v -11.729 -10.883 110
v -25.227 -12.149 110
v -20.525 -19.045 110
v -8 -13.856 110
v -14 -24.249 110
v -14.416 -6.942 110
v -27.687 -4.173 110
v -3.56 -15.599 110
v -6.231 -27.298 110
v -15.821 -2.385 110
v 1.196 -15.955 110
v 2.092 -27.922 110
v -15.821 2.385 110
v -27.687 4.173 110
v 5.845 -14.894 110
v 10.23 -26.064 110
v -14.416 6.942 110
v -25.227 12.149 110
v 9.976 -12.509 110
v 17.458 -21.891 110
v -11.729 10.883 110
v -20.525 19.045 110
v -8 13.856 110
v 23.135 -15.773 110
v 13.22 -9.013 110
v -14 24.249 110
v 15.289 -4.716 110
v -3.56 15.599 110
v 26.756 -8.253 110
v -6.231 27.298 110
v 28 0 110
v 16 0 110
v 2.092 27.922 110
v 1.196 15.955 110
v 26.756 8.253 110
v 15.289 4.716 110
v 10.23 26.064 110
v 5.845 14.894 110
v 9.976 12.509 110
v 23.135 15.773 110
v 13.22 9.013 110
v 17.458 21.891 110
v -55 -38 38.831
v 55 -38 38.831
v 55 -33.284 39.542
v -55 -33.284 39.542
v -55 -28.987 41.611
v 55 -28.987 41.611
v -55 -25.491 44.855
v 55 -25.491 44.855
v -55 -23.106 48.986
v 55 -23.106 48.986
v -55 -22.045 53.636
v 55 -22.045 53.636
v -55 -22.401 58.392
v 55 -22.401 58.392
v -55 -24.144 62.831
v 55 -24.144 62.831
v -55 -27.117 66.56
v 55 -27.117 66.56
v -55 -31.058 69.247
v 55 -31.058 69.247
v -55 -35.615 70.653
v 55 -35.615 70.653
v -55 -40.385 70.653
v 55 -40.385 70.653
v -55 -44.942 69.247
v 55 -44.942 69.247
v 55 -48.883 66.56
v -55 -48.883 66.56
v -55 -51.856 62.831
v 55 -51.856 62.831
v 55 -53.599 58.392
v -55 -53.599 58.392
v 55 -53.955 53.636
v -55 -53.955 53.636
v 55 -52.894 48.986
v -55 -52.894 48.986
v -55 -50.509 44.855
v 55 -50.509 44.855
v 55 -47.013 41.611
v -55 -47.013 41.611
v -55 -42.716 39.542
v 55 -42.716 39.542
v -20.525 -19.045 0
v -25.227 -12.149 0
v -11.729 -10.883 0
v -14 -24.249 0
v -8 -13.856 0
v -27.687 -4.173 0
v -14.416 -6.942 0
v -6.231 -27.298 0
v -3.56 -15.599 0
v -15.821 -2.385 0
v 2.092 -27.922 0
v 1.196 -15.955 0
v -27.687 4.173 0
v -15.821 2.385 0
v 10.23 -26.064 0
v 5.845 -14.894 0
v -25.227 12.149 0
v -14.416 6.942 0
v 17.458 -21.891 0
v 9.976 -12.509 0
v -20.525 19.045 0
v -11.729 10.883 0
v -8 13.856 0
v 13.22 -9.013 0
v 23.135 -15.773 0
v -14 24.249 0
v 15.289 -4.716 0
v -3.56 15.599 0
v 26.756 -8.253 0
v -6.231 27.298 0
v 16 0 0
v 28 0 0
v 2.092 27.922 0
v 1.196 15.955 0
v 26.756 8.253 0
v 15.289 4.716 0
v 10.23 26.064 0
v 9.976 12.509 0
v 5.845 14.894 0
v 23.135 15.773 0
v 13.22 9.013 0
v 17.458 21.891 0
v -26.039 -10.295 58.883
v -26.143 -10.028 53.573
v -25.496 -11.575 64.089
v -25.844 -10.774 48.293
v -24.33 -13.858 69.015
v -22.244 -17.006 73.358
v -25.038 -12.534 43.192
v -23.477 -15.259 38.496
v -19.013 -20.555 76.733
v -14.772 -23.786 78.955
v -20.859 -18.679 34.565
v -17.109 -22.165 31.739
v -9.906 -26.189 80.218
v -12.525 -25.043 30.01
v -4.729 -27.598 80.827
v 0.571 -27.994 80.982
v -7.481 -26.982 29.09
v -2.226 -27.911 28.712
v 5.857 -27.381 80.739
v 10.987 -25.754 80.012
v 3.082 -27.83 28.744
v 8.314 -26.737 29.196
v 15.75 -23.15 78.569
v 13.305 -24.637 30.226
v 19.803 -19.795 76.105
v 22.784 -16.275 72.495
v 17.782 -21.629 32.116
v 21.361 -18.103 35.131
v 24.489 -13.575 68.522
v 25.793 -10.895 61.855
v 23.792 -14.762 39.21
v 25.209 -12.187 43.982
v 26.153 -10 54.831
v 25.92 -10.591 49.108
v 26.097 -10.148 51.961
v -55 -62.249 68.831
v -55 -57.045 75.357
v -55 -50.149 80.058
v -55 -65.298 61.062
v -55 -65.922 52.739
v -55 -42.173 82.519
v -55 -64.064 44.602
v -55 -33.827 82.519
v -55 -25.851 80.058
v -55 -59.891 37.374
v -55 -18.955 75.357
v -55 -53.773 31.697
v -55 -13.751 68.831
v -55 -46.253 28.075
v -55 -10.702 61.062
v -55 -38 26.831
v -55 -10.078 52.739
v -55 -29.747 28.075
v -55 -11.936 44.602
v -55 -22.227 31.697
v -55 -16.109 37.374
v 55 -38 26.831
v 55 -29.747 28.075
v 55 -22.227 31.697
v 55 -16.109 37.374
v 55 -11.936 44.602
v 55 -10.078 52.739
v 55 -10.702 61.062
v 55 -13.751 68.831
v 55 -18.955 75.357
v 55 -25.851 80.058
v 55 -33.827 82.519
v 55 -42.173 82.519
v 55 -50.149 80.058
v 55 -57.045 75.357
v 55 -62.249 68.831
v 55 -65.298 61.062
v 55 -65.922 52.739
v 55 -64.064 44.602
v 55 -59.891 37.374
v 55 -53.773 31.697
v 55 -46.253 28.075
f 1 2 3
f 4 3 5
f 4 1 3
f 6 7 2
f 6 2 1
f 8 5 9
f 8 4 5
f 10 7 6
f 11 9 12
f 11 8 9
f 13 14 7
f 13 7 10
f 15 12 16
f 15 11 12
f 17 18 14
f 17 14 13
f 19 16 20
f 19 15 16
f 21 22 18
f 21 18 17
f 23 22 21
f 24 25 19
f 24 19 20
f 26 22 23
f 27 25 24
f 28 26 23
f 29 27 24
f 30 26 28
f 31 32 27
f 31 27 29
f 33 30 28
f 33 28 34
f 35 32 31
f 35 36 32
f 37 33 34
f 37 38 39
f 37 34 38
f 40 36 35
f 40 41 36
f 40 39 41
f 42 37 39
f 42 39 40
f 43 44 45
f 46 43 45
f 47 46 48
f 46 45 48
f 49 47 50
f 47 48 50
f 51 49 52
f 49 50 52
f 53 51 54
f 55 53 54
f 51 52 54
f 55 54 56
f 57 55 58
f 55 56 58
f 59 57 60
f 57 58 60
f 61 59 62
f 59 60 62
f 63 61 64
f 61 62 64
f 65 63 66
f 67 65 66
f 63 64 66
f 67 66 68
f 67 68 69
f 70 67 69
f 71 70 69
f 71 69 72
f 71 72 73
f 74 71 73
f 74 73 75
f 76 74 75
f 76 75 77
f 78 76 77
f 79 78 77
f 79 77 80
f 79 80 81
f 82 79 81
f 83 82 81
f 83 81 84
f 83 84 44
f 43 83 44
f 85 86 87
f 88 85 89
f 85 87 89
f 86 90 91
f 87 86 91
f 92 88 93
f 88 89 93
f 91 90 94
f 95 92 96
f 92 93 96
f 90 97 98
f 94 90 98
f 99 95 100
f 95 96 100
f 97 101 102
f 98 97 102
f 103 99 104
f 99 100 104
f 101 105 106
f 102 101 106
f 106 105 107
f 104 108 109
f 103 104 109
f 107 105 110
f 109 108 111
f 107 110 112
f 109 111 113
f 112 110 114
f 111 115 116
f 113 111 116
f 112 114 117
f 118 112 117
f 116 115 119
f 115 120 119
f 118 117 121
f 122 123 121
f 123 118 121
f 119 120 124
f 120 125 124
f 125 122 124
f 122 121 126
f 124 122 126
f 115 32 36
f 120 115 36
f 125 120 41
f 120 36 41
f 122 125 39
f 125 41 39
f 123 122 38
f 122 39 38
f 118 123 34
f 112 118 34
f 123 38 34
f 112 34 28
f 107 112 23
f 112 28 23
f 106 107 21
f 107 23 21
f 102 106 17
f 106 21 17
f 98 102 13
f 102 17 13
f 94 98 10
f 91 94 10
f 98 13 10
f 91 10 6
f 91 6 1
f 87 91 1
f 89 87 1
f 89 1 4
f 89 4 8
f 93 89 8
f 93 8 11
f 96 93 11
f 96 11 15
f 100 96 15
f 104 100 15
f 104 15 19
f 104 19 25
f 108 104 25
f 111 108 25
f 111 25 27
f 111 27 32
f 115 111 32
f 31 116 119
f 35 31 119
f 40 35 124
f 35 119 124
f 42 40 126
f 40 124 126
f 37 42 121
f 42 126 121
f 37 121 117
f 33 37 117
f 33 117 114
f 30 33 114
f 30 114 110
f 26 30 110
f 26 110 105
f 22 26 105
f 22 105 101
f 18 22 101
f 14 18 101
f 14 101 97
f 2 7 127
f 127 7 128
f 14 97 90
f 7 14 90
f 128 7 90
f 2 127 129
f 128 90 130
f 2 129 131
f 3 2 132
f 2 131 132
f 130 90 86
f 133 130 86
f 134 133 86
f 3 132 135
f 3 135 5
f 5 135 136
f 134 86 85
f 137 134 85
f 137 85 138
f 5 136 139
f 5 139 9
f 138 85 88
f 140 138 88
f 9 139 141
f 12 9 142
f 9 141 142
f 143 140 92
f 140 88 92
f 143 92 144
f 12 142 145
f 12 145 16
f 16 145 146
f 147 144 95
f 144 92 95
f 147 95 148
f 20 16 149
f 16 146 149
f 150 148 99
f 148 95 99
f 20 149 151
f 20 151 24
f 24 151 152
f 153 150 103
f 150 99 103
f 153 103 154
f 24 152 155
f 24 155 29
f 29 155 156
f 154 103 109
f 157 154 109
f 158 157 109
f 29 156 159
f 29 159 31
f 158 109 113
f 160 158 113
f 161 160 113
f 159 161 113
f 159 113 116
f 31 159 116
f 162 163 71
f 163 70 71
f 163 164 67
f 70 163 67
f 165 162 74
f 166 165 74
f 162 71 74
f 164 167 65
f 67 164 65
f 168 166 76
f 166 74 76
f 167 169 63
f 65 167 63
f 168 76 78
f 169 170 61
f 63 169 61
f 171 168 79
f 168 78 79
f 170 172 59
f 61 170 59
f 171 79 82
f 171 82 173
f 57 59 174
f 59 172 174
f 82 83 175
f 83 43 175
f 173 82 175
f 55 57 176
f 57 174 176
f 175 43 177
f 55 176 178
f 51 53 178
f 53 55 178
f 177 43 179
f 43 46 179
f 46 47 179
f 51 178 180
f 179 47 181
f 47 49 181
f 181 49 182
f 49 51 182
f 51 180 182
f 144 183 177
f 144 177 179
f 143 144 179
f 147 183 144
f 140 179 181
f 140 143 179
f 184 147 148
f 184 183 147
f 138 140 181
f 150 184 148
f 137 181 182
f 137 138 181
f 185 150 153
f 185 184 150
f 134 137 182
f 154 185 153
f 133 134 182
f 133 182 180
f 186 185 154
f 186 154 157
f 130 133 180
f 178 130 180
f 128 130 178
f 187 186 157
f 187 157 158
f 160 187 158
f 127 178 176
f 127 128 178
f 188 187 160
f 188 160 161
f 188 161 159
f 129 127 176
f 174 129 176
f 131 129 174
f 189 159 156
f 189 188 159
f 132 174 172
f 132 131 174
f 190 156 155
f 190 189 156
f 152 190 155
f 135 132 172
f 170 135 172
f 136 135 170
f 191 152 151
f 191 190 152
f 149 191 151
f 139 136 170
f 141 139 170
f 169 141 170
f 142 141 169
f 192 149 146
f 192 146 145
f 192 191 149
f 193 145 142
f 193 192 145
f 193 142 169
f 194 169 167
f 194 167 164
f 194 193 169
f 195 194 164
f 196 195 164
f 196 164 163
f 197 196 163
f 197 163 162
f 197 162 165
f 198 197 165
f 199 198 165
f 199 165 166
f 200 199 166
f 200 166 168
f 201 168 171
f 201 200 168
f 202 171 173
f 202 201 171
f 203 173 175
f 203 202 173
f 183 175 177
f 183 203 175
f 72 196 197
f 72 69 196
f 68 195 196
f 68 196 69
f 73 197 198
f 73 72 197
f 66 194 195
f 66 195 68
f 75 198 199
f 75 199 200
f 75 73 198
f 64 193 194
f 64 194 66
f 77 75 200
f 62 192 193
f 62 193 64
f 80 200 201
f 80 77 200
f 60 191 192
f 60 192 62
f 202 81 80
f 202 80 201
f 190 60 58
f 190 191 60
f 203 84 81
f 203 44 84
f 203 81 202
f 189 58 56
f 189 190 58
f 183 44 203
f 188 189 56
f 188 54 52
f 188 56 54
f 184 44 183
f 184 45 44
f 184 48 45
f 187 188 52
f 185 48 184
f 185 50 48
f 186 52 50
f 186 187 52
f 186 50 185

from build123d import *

# Parameters (mm, degrees)
SKETCH1_R           = 28
BOSS_EXTRUDE1_DEPTH = 110
SKETCH3_R           = 28
BOSS_EXTRUDE2_DEPTH = 55
SKETCH4_R           = 16
CUT_EXTRUDE1_DEPTH  = 140.57435311
SKETCH6_R           = 16
CUT_EXTRUDE2_DEPTH  = 169.985206622


with BuildPart() as part:
    # Sketch1 → Boss-Extrude1 (new body)
    with BuildSketch(Plane.XY):
        Circle(SKETCH1_R)
    extrude(amount=BOSS_EXTRUDE1_DEPTH)

    # Sketch3 → Boss-Extrude2 (add, symmetric)
    with BuildSketch(Plane(origin=(0, 0, 0), x_dir=(0, 0, -1), z_dir=(1, 0, 0))):
        with Locations((-54.831273686, -38)):
            Circle(SKETCH3_R)
    extrude(amount=BOSS_EXTRUDE2_DEPTH, both=True)

    # Sketch4 → Cut-Extrude1 (cut, through all)
    with BuildSketch(Plane.XY.offset(110)):
        Circle(SKETCH4_R)
    extrude(amount=-CUT_EXTRUDE1_DEPTH, mode=Mode.SUBTRACT)

    # Sketch6 → Cut-Extrude2 (cut, through all)
    with BuildSketch(Plane(origin=(55, 0, 0), x_dir=(0, 0, -1), z_dir=(1, 0, 0))):
        with Locations((-54.831273686, -38)):
            Circle(SKETCH6_R)
    extrude(amount=-CUT_EXTRUDE2_DEPTH, mode=Mode.SUBTRACT)


solid = part.part
